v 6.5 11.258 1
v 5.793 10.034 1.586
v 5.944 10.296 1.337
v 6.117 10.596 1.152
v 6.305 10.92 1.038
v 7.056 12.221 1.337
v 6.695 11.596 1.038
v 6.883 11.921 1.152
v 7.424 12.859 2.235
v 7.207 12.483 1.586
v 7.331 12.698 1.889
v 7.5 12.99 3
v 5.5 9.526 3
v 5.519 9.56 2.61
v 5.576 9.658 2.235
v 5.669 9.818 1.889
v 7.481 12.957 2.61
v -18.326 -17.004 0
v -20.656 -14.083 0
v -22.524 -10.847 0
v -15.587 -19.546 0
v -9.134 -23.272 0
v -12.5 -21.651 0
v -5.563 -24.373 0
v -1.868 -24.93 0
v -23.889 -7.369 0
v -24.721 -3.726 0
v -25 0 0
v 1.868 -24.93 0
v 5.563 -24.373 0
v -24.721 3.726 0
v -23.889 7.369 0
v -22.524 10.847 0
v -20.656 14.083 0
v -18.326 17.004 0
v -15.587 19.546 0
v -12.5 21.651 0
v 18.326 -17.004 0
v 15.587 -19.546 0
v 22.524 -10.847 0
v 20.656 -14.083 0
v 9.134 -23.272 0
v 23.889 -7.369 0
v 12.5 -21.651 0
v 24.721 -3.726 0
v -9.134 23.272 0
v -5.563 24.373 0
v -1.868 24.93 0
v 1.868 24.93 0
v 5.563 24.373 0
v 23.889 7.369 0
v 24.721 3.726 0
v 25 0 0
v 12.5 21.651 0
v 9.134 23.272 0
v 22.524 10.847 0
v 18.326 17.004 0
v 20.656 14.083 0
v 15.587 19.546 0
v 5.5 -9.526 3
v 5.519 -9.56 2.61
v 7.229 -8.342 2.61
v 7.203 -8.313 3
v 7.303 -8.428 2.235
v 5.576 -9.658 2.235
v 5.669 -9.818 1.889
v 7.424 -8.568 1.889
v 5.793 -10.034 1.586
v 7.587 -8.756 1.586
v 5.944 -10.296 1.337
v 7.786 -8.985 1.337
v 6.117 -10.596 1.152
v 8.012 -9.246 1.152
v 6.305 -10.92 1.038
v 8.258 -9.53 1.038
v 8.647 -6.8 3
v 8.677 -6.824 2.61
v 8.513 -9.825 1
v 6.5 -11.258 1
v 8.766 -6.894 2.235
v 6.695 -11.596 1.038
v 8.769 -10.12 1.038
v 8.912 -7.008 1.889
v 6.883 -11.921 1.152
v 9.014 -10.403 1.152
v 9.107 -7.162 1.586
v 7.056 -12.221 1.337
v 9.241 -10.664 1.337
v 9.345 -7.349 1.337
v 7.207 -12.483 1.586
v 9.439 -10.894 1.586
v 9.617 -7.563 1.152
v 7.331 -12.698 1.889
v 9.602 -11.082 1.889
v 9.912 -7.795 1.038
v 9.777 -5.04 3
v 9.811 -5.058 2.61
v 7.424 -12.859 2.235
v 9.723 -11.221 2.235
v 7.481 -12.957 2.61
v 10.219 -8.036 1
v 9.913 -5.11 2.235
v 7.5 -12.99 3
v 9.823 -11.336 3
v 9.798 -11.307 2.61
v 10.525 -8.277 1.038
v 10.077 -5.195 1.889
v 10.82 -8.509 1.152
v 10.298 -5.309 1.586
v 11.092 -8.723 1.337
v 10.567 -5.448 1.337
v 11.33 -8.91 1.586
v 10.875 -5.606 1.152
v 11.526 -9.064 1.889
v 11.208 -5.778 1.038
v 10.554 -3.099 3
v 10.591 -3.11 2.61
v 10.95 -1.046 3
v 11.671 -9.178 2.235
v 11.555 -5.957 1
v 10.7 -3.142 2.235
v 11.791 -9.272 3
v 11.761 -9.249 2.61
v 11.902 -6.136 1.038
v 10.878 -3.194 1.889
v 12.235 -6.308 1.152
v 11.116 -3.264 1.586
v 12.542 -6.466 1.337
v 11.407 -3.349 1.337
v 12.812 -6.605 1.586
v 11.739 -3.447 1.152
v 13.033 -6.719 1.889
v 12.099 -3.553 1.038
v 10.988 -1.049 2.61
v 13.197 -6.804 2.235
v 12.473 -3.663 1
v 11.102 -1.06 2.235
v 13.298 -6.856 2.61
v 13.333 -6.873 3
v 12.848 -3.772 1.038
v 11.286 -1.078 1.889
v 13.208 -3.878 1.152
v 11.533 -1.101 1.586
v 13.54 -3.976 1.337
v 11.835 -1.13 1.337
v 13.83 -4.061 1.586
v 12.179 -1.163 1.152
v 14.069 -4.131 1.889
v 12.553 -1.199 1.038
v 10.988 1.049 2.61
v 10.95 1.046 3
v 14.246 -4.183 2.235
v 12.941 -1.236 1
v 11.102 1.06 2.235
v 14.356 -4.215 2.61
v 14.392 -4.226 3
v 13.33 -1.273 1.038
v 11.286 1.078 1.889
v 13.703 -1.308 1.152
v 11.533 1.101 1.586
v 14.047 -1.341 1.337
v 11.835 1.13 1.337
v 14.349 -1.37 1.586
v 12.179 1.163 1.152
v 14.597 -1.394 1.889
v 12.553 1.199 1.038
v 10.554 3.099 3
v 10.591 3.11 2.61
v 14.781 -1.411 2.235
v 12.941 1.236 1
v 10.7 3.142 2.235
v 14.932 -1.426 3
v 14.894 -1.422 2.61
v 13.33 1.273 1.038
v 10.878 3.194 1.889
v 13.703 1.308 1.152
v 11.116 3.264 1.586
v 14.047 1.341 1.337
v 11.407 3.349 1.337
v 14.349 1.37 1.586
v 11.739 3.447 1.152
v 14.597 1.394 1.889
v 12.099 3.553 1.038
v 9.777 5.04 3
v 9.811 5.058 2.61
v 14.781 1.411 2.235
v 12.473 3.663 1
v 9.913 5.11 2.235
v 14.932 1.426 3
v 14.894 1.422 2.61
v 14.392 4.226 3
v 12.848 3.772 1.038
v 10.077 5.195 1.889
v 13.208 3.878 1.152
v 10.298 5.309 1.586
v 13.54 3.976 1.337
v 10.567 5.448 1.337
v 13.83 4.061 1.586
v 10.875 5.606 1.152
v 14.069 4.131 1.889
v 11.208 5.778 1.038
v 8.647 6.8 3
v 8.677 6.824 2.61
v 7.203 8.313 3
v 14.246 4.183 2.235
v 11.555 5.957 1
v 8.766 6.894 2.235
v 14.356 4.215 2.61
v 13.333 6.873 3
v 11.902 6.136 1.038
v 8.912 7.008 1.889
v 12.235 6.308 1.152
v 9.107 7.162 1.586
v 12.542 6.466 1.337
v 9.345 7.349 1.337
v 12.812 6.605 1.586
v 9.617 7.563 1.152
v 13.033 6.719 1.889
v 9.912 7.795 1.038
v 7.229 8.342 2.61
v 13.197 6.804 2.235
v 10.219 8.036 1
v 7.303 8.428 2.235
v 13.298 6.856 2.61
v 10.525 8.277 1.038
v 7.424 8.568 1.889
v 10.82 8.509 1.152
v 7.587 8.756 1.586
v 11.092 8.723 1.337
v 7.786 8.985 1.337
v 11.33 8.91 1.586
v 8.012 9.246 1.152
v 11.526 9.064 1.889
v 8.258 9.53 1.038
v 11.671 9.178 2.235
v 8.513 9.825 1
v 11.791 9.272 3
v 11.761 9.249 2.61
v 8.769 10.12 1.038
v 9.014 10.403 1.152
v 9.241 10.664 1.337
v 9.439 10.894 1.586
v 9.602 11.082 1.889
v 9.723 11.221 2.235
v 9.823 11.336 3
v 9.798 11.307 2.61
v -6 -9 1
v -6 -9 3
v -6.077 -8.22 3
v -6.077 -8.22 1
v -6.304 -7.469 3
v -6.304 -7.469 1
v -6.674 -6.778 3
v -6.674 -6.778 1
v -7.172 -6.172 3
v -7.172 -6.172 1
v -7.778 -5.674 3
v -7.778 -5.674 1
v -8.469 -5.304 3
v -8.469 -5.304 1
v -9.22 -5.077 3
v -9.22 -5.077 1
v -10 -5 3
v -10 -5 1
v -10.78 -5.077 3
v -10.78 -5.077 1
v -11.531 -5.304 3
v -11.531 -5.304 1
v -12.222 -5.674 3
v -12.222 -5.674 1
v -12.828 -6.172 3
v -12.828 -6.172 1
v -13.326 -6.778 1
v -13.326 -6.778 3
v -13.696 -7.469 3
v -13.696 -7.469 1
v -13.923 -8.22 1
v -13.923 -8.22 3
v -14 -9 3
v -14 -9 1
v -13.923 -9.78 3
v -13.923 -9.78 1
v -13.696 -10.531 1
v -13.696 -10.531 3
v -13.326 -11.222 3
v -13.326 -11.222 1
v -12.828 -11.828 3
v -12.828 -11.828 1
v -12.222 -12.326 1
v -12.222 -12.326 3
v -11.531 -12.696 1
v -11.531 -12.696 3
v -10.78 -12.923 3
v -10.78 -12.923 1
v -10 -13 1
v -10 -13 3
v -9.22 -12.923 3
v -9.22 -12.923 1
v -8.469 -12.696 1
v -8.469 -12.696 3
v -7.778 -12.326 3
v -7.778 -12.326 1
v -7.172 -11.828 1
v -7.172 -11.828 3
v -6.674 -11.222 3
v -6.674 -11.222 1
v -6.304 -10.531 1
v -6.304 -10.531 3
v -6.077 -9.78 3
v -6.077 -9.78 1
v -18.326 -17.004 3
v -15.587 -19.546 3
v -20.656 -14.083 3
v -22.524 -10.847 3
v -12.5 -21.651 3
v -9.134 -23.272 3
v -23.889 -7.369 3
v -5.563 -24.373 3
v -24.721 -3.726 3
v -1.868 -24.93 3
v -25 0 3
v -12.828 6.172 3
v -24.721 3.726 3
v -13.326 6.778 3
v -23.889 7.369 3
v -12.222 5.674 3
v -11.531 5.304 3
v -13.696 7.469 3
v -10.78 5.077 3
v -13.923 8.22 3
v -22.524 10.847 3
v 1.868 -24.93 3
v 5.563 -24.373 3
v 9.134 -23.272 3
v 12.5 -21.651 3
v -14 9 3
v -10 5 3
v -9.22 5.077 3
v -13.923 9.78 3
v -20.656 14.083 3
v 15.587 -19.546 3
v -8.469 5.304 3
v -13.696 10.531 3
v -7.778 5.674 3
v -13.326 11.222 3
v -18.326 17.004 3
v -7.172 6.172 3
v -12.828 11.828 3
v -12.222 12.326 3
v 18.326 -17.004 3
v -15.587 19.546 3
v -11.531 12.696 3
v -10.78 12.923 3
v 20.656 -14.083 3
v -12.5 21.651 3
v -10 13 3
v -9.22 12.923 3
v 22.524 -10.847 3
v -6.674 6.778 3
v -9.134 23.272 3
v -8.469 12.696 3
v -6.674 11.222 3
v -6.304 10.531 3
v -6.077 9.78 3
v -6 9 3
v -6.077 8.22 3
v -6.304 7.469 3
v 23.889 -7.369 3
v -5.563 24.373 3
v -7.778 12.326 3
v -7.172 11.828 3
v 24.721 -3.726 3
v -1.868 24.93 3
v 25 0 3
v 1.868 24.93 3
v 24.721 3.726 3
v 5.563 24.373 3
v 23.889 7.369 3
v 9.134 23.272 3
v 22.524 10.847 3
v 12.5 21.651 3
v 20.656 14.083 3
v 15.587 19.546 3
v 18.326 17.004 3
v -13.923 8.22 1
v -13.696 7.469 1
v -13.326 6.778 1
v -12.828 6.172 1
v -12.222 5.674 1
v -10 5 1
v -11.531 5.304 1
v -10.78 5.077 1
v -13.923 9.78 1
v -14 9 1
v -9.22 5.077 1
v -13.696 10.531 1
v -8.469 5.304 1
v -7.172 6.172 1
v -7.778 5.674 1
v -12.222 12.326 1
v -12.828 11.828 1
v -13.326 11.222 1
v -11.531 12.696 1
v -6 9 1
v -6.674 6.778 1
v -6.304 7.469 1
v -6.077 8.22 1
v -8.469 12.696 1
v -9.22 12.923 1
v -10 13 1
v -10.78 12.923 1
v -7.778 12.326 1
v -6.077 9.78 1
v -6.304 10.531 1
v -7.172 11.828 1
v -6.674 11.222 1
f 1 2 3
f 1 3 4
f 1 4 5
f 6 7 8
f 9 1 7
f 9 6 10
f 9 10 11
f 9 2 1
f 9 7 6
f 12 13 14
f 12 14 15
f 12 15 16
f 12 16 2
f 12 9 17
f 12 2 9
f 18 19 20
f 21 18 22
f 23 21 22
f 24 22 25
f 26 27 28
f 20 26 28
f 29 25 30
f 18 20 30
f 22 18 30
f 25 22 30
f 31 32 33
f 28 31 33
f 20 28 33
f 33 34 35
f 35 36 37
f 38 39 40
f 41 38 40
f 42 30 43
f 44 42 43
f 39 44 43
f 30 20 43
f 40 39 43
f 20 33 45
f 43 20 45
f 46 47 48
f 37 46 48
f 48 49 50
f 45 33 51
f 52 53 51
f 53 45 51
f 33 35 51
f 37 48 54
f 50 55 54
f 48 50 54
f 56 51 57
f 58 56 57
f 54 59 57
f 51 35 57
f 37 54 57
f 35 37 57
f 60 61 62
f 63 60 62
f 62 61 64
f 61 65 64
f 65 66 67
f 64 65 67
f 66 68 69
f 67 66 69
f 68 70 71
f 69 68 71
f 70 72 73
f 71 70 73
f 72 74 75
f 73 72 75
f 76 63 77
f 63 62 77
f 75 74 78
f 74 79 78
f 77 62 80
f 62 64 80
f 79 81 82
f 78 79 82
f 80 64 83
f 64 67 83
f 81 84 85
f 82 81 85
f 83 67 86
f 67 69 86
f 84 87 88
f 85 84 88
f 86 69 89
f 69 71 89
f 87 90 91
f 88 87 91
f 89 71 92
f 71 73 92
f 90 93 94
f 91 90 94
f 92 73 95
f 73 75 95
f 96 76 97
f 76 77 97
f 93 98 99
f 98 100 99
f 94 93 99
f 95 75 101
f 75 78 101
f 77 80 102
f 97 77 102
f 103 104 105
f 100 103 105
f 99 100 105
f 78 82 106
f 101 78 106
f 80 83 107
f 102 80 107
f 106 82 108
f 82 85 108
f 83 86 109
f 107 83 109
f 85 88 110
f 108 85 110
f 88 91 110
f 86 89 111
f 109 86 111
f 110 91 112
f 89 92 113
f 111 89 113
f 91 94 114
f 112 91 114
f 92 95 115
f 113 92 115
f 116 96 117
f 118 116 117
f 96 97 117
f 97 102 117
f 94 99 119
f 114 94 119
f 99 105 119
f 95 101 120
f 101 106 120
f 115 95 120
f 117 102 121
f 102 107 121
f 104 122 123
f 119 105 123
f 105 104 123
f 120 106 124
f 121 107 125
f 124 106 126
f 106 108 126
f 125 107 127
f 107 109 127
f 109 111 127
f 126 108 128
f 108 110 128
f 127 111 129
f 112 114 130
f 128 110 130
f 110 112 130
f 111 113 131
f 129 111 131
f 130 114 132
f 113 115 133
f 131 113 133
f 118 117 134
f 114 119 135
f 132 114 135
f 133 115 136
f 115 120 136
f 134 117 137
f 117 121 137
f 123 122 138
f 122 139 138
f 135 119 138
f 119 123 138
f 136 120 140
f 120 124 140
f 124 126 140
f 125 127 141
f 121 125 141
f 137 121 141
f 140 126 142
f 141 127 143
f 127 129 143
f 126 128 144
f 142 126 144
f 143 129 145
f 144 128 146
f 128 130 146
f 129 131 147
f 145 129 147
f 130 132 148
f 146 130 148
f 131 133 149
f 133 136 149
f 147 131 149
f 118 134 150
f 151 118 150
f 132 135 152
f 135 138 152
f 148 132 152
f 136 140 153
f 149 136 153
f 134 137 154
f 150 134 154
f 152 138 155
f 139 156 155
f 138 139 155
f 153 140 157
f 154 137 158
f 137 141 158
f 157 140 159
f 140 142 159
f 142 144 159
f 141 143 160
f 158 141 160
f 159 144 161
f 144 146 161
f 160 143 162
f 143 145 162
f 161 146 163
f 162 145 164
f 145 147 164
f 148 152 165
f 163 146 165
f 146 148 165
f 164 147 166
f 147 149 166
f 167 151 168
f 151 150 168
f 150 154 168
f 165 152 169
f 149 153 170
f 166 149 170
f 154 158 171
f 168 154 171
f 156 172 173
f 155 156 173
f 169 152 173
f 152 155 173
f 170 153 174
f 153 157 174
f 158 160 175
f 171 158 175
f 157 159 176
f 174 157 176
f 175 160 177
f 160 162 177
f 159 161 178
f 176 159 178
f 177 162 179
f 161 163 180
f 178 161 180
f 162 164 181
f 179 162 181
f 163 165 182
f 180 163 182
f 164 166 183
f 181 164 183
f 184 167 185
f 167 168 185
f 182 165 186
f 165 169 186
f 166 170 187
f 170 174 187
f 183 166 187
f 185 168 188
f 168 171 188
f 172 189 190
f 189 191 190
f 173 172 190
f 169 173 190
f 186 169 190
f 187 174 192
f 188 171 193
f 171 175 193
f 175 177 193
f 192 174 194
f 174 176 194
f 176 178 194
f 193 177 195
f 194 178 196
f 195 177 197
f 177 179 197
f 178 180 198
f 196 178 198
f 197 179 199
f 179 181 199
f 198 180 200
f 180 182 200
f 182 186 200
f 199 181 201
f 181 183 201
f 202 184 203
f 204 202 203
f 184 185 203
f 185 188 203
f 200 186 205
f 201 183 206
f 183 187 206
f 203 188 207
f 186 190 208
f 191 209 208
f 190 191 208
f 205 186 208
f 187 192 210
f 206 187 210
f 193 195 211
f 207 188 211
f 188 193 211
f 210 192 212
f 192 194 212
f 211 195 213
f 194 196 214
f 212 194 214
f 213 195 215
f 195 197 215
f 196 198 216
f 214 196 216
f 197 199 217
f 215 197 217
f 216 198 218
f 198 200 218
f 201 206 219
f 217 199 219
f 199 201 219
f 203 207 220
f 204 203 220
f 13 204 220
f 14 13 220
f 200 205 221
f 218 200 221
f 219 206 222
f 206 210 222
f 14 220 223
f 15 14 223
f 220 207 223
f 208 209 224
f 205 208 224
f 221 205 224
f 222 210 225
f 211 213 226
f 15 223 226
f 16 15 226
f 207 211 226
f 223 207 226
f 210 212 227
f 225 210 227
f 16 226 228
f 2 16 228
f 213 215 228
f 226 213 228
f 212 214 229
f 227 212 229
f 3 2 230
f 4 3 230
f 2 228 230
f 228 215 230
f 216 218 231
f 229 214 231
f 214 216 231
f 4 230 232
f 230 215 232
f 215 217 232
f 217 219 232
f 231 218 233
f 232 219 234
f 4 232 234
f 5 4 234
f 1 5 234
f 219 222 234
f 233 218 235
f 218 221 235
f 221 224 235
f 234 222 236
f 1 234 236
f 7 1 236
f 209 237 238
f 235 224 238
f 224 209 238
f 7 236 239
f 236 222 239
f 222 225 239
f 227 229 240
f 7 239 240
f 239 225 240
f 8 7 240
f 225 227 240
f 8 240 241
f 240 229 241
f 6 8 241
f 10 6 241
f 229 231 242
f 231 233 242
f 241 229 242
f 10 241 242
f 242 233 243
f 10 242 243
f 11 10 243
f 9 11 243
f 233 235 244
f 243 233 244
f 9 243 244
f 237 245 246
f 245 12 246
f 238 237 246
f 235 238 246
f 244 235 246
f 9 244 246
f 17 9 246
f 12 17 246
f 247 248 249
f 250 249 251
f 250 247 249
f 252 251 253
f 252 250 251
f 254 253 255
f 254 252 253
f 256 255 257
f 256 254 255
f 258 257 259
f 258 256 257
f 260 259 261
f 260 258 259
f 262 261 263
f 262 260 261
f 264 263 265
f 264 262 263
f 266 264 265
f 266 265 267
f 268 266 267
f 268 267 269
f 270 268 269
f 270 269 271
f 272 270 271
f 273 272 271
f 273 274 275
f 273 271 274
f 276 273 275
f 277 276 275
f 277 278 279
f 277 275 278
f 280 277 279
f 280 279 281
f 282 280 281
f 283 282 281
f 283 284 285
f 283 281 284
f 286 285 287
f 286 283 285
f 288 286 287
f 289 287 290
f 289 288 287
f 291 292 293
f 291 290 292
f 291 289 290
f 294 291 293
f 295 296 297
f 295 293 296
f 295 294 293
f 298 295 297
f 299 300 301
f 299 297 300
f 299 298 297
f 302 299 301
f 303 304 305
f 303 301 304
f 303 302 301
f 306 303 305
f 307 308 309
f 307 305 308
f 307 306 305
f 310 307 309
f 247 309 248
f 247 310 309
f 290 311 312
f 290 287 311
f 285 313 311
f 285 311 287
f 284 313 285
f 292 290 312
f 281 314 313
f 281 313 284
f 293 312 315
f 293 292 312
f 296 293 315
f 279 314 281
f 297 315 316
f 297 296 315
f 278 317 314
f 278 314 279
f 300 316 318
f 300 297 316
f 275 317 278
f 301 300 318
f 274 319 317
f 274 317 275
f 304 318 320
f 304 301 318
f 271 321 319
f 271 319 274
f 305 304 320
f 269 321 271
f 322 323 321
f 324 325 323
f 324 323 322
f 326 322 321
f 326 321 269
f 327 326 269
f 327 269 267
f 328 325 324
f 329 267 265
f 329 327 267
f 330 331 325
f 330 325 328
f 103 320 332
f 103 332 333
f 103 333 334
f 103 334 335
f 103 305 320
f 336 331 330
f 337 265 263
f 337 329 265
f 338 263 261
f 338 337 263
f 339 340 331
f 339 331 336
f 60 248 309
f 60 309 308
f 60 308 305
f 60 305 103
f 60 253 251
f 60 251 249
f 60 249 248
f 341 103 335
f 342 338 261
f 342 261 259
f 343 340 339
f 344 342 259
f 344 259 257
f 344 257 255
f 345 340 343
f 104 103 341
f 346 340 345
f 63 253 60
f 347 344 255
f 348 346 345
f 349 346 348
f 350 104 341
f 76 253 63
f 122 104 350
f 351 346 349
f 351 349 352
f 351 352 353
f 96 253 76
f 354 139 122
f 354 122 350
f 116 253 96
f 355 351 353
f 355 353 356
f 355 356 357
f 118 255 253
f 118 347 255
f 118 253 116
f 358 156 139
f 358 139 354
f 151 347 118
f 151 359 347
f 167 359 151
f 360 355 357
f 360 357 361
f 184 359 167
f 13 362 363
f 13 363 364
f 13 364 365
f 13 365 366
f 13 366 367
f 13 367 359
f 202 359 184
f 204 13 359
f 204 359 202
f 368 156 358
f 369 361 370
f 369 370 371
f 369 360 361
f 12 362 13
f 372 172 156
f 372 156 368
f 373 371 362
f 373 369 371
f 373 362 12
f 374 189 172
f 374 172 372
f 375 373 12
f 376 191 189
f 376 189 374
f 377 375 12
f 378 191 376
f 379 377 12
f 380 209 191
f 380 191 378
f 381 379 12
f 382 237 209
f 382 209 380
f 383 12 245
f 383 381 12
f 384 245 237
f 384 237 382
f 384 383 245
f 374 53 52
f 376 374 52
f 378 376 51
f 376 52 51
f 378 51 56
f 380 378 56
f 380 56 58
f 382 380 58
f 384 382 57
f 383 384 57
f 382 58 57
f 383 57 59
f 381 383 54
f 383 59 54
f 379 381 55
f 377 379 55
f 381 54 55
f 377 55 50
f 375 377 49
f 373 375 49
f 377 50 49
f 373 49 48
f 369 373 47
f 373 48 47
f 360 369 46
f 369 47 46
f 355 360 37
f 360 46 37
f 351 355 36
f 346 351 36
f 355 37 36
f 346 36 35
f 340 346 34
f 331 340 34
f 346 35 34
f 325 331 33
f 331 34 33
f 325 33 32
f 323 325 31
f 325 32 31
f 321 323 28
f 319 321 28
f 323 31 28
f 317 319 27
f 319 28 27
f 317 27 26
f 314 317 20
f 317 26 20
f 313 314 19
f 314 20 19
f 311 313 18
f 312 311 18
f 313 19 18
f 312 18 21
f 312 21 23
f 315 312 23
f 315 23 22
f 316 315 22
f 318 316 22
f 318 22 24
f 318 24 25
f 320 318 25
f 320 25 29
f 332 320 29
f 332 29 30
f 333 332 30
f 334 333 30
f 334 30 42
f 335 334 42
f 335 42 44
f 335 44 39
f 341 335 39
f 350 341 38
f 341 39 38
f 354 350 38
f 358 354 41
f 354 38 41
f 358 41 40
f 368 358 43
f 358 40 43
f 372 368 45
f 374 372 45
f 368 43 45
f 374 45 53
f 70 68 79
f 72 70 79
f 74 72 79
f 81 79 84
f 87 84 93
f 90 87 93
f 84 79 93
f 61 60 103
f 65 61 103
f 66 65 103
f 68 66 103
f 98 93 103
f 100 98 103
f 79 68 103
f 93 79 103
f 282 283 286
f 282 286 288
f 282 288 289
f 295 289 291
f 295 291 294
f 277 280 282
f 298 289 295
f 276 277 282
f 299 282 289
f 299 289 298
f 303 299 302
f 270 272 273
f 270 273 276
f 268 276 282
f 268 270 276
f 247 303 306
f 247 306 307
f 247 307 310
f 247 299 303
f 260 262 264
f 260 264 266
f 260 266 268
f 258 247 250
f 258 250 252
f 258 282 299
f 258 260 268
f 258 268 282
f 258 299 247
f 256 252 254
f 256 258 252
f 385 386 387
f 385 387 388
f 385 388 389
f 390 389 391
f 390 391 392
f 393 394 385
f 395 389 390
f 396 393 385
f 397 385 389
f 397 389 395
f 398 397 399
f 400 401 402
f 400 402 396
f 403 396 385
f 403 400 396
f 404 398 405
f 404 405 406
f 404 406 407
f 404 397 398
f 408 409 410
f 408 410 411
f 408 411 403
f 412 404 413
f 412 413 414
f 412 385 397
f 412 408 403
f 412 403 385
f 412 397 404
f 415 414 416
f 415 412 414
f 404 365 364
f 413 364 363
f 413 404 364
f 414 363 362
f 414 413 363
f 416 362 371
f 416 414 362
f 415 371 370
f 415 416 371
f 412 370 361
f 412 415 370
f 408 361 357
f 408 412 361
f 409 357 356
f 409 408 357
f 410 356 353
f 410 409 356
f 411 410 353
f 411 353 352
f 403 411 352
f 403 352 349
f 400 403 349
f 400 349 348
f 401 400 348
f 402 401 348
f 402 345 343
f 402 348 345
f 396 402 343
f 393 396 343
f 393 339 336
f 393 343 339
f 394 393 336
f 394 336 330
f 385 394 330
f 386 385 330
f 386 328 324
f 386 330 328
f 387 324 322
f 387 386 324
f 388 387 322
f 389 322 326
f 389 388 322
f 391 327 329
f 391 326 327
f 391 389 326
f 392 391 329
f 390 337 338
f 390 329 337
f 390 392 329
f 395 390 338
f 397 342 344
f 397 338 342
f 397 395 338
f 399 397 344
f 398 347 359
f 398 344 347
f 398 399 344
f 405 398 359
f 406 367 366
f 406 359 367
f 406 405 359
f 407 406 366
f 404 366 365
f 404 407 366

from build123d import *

# Parameters (mm, degrees)
CYLINDER002_R         = 4
CYLINDER002_DEPTH     = 3
CYLINDER001_R         = 4
CYLINDER001_DEPTH     = 3
TORUS_R               = 2
TORUS_ANGLE           = 120
TORUS_PLACEMENT_ANGLE = 60
CYLINDER_R            = 25
CYLINDER_DEPTH        = 3


with BuildPart() as cilindre002:
    # Cylinder002 → Cylinder002 (new body)
    with BuildSketch(Plane(origin=(-10, -9, 1), x_dir=(1, 0, 0), z_dir=(0, 0, 1))):
        Circle(CYLINDER002_R)
    extrude(amount=CYLINDER002_DEPTH)


with BuildPart() as fusion:
    # Cylinder001 → Cylinder001 (new body)
    with BuildSketch(Plane(origin=(-10, 9, 1), x_dir=(1, 0, 0), z_dir=(0, 0, 1))):
        Circle(CYLINDER001_R)
    extrude(amount=CYLINDER001_DEPTH)

    # Fusion: union Cilindre002
    add(cilindre002.part)


with BuildPart() as torus:
    # Torus → Torus (revolve)
    with BuildSketch(Plane.XZ):
        with Locations((13, 0)):
            Circle(TORUS_R)
    revolve(axis=Axis((0, 0, 0), (0, 0, 1)), revolution_arc=TORUS_ANGLE)


with BuildPart() as torus_1:
    # Torus placement: moved
    add(torus.part.moved(Location((0, 0, 3))).rotate(Axis((0, 0, 3), (0, 0, -1)), TORUS_PLACEMENT_ANGLE))


with BuildPart() as cut001:
    # Cylinder → Cylinder (new body)
    with BuildSketch(Plane.XY):
        Circle(CYLINDER_R)
    extrude(amount=CYLINDER_DEPTH)

    # Cut: cut Torus
    add(torus_1.part, mode=Mode.SUBTRACT)

    # Cut001: cut Fusion
    add(fusion.part, mode=Mode.SUBTRACT)


solid = cut001.part
